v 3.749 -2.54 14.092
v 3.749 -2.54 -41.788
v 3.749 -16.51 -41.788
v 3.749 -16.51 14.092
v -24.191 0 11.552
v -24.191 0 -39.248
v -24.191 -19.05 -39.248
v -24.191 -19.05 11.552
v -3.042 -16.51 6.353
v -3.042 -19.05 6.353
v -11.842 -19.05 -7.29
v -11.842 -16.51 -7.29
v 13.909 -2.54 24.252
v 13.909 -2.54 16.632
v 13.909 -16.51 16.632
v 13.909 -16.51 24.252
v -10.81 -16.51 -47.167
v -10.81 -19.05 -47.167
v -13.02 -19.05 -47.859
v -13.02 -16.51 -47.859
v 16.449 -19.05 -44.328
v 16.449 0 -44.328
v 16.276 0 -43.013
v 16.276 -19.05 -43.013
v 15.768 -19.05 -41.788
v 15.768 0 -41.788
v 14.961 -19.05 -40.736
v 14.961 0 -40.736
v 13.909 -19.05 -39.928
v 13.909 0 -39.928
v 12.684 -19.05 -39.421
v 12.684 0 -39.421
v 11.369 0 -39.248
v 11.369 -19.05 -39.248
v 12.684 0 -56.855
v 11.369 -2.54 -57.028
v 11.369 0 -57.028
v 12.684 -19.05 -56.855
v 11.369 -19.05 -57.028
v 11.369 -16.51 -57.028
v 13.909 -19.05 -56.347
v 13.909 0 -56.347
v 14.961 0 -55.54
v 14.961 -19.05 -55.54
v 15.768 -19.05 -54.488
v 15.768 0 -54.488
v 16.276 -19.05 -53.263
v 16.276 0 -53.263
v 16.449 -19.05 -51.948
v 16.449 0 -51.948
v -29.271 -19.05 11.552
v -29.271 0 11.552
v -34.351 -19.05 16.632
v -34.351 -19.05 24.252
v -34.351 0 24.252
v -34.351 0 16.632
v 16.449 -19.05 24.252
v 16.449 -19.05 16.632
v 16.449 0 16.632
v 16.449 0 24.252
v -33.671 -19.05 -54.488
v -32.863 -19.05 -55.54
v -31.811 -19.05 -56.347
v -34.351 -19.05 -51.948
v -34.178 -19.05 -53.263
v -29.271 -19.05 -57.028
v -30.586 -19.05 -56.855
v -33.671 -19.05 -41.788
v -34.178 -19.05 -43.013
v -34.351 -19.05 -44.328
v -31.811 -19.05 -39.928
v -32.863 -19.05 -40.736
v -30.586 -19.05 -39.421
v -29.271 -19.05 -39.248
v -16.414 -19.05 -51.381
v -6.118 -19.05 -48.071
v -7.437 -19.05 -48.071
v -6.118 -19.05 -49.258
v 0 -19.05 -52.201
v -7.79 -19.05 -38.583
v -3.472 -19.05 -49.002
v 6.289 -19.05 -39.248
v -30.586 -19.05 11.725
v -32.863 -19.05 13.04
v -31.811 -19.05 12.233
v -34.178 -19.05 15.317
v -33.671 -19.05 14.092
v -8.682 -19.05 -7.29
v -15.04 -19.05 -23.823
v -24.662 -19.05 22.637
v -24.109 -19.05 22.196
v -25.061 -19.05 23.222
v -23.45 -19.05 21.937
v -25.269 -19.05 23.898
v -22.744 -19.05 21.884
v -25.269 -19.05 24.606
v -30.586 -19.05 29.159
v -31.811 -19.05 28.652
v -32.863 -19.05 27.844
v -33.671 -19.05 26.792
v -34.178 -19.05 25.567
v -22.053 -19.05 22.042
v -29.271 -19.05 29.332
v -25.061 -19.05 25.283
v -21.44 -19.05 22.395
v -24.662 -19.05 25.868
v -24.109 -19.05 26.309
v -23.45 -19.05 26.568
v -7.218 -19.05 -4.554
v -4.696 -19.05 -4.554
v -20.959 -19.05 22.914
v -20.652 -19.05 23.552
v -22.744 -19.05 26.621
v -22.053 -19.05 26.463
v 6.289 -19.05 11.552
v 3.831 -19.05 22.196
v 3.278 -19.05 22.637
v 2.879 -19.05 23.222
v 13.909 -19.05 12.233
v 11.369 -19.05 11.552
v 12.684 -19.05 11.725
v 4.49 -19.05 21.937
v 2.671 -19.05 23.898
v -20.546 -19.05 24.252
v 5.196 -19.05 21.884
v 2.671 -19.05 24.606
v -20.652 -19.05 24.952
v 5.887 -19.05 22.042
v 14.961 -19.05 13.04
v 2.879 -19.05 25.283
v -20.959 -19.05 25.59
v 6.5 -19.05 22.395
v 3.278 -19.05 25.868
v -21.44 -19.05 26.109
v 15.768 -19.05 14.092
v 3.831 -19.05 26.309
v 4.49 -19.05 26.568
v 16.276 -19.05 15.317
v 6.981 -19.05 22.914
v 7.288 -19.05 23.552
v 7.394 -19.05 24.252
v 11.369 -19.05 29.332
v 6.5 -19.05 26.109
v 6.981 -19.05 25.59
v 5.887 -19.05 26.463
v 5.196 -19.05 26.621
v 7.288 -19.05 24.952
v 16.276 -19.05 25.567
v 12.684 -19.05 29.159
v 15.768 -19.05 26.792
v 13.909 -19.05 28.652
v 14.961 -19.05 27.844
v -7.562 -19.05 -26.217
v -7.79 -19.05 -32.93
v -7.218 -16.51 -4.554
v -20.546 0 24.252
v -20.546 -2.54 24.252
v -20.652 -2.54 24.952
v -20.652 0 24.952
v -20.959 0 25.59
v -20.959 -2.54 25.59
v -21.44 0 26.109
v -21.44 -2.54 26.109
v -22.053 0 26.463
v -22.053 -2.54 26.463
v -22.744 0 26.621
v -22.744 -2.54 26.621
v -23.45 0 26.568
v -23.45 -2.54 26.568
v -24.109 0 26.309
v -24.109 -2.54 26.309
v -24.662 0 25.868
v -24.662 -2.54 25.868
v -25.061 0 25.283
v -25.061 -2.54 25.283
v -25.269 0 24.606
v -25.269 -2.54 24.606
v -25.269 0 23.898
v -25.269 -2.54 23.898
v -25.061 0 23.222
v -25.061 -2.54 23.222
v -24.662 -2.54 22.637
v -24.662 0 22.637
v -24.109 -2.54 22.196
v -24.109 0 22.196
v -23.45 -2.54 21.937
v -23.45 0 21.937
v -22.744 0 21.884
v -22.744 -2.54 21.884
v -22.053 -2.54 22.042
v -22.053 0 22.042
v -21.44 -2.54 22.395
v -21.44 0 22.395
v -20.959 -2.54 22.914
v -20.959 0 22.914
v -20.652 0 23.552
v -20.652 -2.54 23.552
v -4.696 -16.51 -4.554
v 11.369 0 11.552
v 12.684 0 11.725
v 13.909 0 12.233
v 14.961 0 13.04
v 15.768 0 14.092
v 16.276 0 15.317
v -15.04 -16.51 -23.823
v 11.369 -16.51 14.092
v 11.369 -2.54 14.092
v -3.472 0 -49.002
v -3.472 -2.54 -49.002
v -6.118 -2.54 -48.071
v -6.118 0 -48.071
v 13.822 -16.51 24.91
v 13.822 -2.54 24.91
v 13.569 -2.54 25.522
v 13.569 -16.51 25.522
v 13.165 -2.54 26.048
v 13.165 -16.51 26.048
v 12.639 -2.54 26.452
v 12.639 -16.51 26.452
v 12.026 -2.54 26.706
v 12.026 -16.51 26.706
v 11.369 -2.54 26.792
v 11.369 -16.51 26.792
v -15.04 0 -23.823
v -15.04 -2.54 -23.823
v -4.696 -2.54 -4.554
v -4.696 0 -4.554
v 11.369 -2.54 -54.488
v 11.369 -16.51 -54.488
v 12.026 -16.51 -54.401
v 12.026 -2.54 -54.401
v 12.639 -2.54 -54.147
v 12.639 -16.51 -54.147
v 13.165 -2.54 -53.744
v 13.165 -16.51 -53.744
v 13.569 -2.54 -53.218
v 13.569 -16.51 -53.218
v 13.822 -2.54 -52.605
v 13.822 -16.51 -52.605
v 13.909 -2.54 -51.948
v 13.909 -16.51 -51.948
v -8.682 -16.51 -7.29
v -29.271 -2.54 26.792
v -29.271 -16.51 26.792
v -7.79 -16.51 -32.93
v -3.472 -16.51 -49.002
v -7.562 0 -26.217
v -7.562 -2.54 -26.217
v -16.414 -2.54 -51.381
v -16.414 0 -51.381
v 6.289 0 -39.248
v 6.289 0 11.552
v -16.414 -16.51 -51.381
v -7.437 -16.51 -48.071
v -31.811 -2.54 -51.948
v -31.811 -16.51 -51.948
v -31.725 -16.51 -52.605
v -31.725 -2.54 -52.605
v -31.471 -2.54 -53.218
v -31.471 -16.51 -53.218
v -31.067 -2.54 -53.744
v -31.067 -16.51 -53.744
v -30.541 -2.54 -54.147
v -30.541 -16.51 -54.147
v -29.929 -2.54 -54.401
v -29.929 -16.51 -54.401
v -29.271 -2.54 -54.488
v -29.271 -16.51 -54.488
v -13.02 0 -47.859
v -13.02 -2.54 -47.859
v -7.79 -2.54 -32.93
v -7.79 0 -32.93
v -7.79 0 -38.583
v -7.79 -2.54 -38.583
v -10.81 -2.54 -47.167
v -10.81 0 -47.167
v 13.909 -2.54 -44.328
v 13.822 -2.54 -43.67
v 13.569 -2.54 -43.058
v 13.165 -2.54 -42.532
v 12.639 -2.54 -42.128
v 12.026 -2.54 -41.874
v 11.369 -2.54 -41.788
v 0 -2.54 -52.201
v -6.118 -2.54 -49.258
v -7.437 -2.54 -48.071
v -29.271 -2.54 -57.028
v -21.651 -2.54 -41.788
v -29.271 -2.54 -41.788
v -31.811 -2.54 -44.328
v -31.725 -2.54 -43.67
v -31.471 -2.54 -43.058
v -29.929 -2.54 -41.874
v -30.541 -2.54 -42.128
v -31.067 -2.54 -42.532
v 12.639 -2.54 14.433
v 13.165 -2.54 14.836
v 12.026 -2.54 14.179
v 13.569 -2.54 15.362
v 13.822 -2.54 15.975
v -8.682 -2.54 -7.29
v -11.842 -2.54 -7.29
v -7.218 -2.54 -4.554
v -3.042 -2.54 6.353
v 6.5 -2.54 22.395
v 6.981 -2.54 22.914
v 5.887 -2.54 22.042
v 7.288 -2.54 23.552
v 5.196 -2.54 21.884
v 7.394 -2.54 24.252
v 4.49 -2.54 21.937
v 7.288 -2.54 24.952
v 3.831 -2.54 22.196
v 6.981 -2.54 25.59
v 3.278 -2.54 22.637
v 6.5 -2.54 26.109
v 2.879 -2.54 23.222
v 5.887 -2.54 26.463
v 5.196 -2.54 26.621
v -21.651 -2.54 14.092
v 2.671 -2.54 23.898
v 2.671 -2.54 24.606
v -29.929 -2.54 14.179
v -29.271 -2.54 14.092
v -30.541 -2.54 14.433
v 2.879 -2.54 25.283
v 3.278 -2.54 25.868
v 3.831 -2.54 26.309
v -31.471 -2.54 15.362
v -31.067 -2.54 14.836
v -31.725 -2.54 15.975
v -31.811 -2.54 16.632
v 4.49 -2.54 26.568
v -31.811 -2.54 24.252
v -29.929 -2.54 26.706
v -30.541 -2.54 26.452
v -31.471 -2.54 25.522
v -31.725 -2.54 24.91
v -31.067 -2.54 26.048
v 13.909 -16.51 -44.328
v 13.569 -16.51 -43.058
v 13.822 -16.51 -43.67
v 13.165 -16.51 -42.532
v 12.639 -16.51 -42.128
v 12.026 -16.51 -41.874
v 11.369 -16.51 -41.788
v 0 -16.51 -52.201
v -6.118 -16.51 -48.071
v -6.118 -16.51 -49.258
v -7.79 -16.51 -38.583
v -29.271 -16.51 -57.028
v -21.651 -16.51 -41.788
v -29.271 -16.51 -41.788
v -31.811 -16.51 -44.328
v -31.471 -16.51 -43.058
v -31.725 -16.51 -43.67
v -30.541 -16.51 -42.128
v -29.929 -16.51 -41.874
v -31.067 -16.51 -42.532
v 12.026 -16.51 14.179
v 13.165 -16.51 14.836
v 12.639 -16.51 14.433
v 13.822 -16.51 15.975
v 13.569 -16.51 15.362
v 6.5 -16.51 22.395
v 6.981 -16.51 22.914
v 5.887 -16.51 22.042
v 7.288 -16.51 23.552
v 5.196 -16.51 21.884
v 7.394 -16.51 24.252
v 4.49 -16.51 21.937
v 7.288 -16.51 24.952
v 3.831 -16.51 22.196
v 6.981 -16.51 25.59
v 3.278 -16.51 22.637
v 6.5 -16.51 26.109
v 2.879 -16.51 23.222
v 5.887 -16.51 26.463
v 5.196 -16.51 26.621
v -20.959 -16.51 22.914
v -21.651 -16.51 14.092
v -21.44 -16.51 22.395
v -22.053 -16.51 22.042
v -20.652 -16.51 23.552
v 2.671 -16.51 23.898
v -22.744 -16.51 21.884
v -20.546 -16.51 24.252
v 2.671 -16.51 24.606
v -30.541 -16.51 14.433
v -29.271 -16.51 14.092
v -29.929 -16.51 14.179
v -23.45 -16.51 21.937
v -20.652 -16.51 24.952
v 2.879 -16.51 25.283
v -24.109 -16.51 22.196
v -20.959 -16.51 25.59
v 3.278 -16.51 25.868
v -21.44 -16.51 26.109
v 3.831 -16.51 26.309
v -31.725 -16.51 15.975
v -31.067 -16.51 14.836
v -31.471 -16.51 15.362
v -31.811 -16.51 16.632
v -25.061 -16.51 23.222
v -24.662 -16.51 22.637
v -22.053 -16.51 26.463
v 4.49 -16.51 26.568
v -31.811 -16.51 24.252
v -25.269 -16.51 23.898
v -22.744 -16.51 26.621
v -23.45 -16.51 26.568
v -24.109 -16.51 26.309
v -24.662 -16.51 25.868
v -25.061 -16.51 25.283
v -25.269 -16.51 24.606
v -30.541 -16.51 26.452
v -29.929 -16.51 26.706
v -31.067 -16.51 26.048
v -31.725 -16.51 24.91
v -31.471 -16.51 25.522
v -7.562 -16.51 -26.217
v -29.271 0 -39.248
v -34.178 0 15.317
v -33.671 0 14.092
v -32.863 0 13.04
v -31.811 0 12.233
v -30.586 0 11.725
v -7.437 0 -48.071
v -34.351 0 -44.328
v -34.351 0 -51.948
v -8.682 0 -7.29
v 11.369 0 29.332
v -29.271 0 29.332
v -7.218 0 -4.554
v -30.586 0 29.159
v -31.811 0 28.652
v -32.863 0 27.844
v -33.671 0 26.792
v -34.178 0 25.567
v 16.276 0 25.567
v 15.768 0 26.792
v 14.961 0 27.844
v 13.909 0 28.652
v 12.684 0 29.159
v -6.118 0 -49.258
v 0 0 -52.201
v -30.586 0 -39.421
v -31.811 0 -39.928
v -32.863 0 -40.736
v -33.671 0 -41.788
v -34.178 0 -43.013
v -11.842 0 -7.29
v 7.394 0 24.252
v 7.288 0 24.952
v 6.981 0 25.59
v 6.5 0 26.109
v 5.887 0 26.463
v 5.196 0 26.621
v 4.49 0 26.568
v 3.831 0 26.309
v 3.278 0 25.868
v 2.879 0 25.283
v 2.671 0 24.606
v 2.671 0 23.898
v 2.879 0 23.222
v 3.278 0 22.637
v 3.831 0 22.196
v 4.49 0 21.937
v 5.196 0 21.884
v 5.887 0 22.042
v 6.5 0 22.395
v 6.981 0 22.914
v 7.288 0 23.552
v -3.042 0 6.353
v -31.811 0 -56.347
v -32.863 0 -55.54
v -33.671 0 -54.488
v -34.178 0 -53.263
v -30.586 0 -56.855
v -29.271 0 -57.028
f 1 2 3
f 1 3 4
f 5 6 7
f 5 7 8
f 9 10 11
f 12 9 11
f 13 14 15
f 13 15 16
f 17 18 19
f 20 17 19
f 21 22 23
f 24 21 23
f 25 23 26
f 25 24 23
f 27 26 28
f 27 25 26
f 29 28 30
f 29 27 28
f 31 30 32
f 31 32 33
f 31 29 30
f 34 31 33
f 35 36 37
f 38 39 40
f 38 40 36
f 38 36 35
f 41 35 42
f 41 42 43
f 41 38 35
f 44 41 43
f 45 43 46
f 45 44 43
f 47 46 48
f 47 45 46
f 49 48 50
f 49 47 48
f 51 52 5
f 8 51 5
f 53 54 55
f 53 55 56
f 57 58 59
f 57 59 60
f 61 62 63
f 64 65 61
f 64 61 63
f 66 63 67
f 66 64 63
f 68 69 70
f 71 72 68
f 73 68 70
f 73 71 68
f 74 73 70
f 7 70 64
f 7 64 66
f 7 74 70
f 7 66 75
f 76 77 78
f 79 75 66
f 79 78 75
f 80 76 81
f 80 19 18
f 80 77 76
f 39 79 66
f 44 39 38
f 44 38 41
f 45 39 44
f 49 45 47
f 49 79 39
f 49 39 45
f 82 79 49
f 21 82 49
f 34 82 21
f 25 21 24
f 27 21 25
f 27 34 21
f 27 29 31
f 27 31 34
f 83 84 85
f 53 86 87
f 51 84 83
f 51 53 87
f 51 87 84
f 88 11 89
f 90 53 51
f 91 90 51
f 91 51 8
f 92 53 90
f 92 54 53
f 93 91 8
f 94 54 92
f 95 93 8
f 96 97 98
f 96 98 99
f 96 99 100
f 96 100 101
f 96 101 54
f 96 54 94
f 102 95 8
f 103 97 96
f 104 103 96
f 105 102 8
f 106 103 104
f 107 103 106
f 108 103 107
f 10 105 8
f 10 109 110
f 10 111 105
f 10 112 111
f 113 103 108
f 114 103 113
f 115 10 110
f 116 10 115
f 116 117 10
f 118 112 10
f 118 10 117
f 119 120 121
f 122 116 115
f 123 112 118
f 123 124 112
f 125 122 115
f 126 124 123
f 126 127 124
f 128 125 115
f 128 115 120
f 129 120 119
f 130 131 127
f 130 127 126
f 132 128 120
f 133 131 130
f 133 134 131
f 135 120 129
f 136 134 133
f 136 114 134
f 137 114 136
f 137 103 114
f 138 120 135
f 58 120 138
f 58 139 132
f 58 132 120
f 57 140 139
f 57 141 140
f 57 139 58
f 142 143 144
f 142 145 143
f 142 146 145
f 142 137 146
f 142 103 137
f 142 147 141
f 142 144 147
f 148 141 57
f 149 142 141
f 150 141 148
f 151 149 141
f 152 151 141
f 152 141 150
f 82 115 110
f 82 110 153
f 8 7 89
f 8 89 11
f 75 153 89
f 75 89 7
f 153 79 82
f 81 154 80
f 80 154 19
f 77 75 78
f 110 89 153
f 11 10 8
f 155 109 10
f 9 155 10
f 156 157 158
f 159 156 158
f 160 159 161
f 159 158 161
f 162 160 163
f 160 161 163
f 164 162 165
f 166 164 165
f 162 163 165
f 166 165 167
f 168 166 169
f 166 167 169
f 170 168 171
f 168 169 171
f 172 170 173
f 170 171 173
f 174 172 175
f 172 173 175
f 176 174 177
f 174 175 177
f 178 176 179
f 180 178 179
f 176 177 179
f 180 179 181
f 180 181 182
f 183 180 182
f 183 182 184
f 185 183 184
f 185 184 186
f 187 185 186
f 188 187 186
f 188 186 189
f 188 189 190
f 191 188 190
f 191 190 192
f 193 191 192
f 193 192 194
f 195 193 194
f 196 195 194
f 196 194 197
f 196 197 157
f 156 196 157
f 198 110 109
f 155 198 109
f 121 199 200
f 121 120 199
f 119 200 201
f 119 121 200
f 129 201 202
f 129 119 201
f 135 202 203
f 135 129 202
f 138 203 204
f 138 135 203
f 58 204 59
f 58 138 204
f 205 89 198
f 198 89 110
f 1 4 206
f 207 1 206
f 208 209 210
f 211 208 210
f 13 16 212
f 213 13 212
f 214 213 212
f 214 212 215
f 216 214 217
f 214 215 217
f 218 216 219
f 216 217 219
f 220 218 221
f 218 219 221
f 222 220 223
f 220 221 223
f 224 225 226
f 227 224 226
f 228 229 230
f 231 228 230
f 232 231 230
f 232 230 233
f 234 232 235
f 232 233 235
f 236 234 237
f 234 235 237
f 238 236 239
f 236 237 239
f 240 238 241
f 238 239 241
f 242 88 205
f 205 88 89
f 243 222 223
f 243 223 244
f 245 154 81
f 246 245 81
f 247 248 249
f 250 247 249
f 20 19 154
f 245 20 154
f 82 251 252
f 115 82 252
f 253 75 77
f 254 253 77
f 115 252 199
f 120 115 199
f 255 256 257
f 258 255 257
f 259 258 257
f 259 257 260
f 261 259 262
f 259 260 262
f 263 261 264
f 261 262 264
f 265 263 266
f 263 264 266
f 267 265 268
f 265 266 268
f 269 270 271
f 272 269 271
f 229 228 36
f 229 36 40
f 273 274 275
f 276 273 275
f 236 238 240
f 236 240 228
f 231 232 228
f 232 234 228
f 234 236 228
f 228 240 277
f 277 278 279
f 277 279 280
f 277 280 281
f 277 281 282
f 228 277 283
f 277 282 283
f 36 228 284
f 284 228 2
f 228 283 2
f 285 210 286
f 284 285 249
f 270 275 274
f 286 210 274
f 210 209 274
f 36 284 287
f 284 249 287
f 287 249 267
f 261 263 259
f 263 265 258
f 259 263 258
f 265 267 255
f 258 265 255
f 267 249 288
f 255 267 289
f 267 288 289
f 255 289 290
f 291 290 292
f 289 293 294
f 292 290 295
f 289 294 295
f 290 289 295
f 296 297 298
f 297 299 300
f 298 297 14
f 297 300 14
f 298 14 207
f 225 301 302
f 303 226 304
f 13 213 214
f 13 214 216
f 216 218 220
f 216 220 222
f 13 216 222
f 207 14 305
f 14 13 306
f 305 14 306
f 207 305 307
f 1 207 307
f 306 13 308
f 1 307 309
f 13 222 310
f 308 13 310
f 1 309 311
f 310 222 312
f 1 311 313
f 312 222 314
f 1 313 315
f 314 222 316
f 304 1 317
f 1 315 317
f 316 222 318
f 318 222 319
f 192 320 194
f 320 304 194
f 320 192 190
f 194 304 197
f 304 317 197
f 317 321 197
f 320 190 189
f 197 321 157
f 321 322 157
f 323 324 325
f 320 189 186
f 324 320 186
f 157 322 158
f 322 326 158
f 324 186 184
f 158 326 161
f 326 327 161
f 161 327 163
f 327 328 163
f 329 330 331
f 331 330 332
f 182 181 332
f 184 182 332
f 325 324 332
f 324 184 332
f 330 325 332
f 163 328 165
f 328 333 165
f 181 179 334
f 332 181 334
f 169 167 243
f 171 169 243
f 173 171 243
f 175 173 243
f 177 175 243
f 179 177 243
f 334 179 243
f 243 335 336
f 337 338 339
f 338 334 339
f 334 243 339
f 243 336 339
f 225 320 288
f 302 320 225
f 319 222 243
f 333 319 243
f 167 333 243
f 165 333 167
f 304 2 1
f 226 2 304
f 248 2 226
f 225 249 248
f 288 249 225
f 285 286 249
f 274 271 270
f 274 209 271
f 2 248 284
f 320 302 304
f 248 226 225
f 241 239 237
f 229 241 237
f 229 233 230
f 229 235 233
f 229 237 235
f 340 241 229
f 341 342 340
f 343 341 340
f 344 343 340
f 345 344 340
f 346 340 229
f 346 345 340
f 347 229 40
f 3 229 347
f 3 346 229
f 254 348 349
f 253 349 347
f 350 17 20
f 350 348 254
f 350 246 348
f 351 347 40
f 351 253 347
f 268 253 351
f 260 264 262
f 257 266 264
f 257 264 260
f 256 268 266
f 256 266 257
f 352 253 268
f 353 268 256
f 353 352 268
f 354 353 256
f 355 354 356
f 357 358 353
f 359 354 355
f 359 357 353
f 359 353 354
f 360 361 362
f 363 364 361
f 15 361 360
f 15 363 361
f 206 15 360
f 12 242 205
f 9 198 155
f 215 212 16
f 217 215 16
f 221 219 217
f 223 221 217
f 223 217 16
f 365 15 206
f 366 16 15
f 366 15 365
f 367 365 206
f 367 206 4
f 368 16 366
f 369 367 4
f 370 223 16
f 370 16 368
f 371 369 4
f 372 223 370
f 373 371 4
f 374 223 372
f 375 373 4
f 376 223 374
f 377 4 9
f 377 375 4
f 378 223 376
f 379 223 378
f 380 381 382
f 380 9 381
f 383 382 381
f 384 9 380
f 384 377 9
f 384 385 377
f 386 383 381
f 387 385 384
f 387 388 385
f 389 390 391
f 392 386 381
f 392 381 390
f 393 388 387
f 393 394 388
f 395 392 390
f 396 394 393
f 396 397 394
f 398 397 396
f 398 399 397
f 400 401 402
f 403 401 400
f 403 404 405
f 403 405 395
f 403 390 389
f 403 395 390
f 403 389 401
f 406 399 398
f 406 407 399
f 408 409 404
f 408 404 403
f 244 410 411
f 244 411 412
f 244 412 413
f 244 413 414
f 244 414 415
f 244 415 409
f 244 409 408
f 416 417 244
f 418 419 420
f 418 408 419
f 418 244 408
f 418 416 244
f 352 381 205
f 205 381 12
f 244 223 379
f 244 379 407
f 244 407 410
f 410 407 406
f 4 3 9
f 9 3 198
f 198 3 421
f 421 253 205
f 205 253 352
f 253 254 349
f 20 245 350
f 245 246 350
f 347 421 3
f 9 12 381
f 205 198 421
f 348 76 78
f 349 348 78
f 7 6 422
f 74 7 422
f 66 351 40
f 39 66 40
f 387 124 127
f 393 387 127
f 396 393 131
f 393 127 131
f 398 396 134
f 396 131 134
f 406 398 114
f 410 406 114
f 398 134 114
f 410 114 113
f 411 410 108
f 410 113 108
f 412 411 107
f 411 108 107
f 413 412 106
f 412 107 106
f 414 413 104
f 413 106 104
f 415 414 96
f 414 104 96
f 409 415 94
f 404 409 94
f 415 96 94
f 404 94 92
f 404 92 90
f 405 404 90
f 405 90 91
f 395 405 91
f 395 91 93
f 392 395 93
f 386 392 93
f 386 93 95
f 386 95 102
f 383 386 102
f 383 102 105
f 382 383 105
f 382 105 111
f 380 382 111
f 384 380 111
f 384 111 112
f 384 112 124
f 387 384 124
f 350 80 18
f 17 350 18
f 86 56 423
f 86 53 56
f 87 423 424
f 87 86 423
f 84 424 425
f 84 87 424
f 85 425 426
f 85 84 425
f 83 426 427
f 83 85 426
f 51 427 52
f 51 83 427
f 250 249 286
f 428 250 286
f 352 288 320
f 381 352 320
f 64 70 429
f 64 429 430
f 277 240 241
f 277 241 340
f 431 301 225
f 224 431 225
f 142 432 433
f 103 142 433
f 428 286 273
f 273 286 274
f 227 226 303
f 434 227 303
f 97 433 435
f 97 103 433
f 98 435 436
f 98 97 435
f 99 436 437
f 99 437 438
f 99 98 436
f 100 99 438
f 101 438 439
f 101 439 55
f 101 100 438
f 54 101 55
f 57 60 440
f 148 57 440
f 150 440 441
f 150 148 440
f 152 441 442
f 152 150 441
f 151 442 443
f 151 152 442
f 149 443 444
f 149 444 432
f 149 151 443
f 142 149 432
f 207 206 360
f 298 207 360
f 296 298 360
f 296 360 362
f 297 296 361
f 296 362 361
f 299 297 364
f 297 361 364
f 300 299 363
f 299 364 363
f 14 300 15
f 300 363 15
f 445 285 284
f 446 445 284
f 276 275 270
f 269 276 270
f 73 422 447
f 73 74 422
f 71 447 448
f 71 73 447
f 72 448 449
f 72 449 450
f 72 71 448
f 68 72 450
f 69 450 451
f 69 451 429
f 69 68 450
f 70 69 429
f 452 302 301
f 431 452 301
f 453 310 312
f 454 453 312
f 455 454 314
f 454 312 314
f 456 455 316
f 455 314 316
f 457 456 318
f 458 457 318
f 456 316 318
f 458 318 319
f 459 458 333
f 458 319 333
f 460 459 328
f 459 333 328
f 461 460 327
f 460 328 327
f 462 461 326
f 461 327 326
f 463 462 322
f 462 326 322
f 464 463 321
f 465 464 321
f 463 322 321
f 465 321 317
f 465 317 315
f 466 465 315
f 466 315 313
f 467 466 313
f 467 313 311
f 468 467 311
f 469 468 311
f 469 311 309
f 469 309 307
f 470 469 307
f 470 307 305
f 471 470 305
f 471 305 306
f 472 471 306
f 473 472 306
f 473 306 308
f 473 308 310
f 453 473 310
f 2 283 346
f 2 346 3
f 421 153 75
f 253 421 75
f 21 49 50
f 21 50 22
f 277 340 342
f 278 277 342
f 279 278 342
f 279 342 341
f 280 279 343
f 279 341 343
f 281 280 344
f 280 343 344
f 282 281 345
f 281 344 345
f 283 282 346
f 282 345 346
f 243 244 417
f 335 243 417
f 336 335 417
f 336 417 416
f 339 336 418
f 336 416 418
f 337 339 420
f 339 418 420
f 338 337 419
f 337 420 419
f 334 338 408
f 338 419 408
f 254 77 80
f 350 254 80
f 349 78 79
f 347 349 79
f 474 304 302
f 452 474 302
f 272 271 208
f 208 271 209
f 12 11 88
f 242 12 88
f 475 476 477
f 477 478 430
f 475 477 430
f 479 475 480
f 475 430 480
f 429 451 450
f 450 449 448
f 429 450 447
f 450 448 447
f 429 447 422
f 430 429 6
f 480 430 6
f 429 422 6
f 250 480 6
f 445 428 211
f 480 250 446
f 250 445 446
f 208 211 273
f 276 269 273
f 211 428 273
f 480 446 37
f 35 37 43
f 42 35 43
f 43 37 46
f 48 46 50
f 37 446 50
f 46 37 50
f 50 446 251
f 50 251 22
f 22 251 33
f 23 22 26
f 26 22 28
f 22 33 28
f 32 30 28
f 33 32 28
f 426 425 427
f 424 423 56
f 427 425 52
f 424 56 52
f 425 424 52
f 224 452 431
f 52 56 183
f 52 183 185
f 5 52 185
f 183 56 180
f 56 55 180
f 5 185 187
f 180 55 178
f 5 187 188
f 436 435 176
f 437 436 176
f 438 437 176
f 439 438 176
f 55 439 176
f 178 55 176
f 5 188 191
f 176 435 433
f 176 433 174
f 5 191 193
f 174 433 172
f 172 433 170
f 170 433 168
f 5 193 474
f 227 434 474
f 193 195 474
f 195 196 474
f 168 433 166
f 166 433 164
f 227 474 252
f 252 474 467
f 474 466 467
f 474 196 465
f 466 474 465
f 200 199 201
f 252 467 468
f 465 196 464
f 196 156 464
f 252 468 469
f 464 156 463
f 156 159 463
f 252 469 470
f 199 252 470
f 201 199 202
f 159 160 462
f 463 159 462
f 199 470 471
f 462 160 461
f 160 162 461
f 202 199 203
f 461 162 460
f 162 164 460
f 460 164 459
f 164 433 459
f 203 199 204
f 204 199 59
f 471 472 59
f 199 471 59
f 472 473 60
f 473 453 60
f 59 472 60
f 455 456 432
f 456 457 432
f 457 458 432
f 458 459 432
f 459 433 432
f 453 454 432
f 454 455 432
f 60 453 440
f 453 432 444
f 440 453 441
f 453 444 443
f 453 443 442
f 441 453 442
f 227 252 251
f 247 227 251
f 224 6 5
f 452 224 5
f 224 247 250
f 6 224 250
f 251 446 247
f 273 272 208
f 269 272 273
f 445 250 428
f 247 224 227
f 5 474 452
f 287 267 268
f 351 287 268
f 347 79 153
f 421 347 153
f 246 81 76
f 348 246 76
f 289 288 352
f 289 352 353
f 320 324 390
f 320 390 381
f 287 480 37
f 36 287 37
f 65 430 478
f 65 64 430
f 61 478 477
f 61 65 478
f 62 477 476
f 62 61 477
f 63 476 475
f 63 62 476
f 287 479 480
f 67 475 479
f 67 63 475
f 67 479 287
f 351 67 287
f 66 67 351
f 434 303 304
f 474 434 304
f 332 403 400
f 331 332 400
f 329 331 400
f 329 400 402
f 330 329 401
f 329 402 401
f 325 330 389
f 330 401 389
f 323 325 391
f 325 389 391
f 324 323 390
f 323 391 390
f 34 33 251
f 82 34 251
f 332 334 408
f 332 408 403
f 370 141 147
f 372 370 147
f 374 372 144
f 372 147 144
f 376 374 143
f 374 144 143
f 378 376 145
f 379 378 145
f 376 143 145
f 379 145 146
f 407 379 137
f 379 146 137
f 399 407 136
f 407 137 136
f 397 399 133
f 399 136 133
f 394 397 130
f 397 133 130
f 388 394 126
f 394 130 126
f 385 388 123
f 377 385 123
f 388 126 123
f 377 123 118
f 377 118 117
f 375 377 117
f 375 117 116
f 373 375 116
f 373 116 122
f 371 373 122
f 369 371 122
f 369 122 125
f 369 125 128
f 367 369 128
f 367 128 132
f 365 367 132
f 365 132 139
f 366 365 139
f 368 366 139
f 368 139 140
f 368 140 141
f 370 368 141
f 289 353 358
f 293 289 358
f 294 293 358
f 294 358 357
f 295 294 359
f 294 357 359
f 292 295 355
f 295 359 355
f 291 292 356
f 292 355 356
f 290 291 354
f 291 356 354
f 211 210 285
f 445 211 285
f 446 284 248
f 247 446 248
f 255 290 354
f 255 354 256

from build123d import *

# Parameters (mm, degrees)
F0_W     = 30.48
F0_H     = 50.8
F1_DEPTH = 19.05
F2_R     = 5.08
F4_T     = -2.54
F3_R     = 2.3749
F5_DEPTH = 45.59299
F7_DEPTH = 16.68371
F8_DEPTH = 25.4


# Not quite as in the source:
# - a shell that OpenCascade refuses in one call is made with other operations: the cavity is built on its own and cut out


with BuildPart() as f1:
    # F0 (on Front) → F1 (new body)
    with BuildSketch(Plane.XZ):
        with Locations((-8.951122936, -13.8477537125)):
            Rectangle(F0_W, F0_H)
        Polygon((6.288877064, -39.2477537125), (-24.191122936, -39.2477537125), (-34.351122936, -39.2477537125), (-34.351122936, -57.0277537125), (16.448877064, -57.0277537125), (16.448877064, -39.2477537125), align=None)
        Polygon((16.448877064, 29.3322462875), (-34.351122936, 29.3322462875), (-34.351122936, 11.5522462875), (-24.191122936, 11.5522462875), (6.288877064, 11.5522462875), (16.448877064, 11.5522462875), align=None)
    extrude(amount=F1_DEPTH)

    # F2
    f2_edges = [f1.edges().sort_by_distance(p)[0] for p in [
        (-34.351123, -9.525, 11.552246),
        (16.448877, -9.525, 11.552246),
        (16.448877, -9.525, 29.332246),
        (-34.351123, -9.525, 29.332246),
        (-34.351123, -9.525, -39.247754),
        (-34.351123, -9.525, -57.027754),
        (16.448877, -9.525, -57.027754),
        (16.448877, -9.525, -39.247754),
    ]]
    fillet(f2_edges, radius=F2_R)

    # F4: a shell. OpenCascade refuses it in one call, so the cavity is built on its own and cut out:
    # the body offset inwards by the wall thickness, plus a prism from it out through each open face.
    f4_core = offset(f1.part, amount=F4_T, kind=Kind.INTERSECTION, mode=Mode.PRIVATE)
    f4_exits = [f4_core.faces().sort_by_distance(p)[0] for p in [
        (-8.951123, -9.525, -54.487754),
    ]]
    add(f4_core, mode=Mode.SUBTRACT)
    extrude(f4_exits, amount=-F4_T, mode=Mode.SUBTRACT)

    # F3 (on face) → F5 (cut)
    with BuildSketch(Plane.XZ.offset(19.05)):
        with Locations((-22.921122936, 24.2522462875)):
            Circle(F3_R)
        with Locations((5.018877064, 24.2522462875)):
            Circle(F3_R)
    extrude(amount=-F5_DEPTH, mode=Mode.SUBTRACT)

    # F6 (on face) → F7 (cut)
    with BuildSketch(Plane.XZ.offset(19.05)):
        Polygon((-7.217857521, -4.5538423583), (-3.042159602, 6.352733355), (-11.8417982012, -7.2901686653), (-8.6815273389, -7.2901686653), (-15.0396805257, -23.8231290132), (-4.6957456507, -4.5538423583), align=None)
    extrude(amount=-F7_DEPTH, mode=Mode.SUBTRACT)

    # F6 (on face) → F8 (cut)
    with BuildSketch(Plane.XZ.offset(19.05)):
        Polygon((-7.217857521, -4.5538423583), (-3.042159602, 6.352733355), (-11.8417982012, -7.2901686653), (-8.6815273389, -7.2901686653), (-15.0396805257, -23.8231290132), (-4.6957456507, -4.5538423583), align=None)
        Polygon((-7.5618713163, -26.2167993933), (-16.4136328948, -51.3810502087), (-7.4369557778, -48.071410507), (-7.7901184559, -38.5827049613), (-10.809615066, -47.1666878623), (-13.0202344465, -47.8591975347), (-7.7901184559, -32.9299127667), (-3.4719579703, -49.0020355231), (-6.1175874434, -48.071410507), (-6.1175874434, -49.2577214361), (0, -52.201025188), align=None)
    extrude(amount=-F8_DEPTH, mode=Mode.SUBTRACT)


solid = f1.part
